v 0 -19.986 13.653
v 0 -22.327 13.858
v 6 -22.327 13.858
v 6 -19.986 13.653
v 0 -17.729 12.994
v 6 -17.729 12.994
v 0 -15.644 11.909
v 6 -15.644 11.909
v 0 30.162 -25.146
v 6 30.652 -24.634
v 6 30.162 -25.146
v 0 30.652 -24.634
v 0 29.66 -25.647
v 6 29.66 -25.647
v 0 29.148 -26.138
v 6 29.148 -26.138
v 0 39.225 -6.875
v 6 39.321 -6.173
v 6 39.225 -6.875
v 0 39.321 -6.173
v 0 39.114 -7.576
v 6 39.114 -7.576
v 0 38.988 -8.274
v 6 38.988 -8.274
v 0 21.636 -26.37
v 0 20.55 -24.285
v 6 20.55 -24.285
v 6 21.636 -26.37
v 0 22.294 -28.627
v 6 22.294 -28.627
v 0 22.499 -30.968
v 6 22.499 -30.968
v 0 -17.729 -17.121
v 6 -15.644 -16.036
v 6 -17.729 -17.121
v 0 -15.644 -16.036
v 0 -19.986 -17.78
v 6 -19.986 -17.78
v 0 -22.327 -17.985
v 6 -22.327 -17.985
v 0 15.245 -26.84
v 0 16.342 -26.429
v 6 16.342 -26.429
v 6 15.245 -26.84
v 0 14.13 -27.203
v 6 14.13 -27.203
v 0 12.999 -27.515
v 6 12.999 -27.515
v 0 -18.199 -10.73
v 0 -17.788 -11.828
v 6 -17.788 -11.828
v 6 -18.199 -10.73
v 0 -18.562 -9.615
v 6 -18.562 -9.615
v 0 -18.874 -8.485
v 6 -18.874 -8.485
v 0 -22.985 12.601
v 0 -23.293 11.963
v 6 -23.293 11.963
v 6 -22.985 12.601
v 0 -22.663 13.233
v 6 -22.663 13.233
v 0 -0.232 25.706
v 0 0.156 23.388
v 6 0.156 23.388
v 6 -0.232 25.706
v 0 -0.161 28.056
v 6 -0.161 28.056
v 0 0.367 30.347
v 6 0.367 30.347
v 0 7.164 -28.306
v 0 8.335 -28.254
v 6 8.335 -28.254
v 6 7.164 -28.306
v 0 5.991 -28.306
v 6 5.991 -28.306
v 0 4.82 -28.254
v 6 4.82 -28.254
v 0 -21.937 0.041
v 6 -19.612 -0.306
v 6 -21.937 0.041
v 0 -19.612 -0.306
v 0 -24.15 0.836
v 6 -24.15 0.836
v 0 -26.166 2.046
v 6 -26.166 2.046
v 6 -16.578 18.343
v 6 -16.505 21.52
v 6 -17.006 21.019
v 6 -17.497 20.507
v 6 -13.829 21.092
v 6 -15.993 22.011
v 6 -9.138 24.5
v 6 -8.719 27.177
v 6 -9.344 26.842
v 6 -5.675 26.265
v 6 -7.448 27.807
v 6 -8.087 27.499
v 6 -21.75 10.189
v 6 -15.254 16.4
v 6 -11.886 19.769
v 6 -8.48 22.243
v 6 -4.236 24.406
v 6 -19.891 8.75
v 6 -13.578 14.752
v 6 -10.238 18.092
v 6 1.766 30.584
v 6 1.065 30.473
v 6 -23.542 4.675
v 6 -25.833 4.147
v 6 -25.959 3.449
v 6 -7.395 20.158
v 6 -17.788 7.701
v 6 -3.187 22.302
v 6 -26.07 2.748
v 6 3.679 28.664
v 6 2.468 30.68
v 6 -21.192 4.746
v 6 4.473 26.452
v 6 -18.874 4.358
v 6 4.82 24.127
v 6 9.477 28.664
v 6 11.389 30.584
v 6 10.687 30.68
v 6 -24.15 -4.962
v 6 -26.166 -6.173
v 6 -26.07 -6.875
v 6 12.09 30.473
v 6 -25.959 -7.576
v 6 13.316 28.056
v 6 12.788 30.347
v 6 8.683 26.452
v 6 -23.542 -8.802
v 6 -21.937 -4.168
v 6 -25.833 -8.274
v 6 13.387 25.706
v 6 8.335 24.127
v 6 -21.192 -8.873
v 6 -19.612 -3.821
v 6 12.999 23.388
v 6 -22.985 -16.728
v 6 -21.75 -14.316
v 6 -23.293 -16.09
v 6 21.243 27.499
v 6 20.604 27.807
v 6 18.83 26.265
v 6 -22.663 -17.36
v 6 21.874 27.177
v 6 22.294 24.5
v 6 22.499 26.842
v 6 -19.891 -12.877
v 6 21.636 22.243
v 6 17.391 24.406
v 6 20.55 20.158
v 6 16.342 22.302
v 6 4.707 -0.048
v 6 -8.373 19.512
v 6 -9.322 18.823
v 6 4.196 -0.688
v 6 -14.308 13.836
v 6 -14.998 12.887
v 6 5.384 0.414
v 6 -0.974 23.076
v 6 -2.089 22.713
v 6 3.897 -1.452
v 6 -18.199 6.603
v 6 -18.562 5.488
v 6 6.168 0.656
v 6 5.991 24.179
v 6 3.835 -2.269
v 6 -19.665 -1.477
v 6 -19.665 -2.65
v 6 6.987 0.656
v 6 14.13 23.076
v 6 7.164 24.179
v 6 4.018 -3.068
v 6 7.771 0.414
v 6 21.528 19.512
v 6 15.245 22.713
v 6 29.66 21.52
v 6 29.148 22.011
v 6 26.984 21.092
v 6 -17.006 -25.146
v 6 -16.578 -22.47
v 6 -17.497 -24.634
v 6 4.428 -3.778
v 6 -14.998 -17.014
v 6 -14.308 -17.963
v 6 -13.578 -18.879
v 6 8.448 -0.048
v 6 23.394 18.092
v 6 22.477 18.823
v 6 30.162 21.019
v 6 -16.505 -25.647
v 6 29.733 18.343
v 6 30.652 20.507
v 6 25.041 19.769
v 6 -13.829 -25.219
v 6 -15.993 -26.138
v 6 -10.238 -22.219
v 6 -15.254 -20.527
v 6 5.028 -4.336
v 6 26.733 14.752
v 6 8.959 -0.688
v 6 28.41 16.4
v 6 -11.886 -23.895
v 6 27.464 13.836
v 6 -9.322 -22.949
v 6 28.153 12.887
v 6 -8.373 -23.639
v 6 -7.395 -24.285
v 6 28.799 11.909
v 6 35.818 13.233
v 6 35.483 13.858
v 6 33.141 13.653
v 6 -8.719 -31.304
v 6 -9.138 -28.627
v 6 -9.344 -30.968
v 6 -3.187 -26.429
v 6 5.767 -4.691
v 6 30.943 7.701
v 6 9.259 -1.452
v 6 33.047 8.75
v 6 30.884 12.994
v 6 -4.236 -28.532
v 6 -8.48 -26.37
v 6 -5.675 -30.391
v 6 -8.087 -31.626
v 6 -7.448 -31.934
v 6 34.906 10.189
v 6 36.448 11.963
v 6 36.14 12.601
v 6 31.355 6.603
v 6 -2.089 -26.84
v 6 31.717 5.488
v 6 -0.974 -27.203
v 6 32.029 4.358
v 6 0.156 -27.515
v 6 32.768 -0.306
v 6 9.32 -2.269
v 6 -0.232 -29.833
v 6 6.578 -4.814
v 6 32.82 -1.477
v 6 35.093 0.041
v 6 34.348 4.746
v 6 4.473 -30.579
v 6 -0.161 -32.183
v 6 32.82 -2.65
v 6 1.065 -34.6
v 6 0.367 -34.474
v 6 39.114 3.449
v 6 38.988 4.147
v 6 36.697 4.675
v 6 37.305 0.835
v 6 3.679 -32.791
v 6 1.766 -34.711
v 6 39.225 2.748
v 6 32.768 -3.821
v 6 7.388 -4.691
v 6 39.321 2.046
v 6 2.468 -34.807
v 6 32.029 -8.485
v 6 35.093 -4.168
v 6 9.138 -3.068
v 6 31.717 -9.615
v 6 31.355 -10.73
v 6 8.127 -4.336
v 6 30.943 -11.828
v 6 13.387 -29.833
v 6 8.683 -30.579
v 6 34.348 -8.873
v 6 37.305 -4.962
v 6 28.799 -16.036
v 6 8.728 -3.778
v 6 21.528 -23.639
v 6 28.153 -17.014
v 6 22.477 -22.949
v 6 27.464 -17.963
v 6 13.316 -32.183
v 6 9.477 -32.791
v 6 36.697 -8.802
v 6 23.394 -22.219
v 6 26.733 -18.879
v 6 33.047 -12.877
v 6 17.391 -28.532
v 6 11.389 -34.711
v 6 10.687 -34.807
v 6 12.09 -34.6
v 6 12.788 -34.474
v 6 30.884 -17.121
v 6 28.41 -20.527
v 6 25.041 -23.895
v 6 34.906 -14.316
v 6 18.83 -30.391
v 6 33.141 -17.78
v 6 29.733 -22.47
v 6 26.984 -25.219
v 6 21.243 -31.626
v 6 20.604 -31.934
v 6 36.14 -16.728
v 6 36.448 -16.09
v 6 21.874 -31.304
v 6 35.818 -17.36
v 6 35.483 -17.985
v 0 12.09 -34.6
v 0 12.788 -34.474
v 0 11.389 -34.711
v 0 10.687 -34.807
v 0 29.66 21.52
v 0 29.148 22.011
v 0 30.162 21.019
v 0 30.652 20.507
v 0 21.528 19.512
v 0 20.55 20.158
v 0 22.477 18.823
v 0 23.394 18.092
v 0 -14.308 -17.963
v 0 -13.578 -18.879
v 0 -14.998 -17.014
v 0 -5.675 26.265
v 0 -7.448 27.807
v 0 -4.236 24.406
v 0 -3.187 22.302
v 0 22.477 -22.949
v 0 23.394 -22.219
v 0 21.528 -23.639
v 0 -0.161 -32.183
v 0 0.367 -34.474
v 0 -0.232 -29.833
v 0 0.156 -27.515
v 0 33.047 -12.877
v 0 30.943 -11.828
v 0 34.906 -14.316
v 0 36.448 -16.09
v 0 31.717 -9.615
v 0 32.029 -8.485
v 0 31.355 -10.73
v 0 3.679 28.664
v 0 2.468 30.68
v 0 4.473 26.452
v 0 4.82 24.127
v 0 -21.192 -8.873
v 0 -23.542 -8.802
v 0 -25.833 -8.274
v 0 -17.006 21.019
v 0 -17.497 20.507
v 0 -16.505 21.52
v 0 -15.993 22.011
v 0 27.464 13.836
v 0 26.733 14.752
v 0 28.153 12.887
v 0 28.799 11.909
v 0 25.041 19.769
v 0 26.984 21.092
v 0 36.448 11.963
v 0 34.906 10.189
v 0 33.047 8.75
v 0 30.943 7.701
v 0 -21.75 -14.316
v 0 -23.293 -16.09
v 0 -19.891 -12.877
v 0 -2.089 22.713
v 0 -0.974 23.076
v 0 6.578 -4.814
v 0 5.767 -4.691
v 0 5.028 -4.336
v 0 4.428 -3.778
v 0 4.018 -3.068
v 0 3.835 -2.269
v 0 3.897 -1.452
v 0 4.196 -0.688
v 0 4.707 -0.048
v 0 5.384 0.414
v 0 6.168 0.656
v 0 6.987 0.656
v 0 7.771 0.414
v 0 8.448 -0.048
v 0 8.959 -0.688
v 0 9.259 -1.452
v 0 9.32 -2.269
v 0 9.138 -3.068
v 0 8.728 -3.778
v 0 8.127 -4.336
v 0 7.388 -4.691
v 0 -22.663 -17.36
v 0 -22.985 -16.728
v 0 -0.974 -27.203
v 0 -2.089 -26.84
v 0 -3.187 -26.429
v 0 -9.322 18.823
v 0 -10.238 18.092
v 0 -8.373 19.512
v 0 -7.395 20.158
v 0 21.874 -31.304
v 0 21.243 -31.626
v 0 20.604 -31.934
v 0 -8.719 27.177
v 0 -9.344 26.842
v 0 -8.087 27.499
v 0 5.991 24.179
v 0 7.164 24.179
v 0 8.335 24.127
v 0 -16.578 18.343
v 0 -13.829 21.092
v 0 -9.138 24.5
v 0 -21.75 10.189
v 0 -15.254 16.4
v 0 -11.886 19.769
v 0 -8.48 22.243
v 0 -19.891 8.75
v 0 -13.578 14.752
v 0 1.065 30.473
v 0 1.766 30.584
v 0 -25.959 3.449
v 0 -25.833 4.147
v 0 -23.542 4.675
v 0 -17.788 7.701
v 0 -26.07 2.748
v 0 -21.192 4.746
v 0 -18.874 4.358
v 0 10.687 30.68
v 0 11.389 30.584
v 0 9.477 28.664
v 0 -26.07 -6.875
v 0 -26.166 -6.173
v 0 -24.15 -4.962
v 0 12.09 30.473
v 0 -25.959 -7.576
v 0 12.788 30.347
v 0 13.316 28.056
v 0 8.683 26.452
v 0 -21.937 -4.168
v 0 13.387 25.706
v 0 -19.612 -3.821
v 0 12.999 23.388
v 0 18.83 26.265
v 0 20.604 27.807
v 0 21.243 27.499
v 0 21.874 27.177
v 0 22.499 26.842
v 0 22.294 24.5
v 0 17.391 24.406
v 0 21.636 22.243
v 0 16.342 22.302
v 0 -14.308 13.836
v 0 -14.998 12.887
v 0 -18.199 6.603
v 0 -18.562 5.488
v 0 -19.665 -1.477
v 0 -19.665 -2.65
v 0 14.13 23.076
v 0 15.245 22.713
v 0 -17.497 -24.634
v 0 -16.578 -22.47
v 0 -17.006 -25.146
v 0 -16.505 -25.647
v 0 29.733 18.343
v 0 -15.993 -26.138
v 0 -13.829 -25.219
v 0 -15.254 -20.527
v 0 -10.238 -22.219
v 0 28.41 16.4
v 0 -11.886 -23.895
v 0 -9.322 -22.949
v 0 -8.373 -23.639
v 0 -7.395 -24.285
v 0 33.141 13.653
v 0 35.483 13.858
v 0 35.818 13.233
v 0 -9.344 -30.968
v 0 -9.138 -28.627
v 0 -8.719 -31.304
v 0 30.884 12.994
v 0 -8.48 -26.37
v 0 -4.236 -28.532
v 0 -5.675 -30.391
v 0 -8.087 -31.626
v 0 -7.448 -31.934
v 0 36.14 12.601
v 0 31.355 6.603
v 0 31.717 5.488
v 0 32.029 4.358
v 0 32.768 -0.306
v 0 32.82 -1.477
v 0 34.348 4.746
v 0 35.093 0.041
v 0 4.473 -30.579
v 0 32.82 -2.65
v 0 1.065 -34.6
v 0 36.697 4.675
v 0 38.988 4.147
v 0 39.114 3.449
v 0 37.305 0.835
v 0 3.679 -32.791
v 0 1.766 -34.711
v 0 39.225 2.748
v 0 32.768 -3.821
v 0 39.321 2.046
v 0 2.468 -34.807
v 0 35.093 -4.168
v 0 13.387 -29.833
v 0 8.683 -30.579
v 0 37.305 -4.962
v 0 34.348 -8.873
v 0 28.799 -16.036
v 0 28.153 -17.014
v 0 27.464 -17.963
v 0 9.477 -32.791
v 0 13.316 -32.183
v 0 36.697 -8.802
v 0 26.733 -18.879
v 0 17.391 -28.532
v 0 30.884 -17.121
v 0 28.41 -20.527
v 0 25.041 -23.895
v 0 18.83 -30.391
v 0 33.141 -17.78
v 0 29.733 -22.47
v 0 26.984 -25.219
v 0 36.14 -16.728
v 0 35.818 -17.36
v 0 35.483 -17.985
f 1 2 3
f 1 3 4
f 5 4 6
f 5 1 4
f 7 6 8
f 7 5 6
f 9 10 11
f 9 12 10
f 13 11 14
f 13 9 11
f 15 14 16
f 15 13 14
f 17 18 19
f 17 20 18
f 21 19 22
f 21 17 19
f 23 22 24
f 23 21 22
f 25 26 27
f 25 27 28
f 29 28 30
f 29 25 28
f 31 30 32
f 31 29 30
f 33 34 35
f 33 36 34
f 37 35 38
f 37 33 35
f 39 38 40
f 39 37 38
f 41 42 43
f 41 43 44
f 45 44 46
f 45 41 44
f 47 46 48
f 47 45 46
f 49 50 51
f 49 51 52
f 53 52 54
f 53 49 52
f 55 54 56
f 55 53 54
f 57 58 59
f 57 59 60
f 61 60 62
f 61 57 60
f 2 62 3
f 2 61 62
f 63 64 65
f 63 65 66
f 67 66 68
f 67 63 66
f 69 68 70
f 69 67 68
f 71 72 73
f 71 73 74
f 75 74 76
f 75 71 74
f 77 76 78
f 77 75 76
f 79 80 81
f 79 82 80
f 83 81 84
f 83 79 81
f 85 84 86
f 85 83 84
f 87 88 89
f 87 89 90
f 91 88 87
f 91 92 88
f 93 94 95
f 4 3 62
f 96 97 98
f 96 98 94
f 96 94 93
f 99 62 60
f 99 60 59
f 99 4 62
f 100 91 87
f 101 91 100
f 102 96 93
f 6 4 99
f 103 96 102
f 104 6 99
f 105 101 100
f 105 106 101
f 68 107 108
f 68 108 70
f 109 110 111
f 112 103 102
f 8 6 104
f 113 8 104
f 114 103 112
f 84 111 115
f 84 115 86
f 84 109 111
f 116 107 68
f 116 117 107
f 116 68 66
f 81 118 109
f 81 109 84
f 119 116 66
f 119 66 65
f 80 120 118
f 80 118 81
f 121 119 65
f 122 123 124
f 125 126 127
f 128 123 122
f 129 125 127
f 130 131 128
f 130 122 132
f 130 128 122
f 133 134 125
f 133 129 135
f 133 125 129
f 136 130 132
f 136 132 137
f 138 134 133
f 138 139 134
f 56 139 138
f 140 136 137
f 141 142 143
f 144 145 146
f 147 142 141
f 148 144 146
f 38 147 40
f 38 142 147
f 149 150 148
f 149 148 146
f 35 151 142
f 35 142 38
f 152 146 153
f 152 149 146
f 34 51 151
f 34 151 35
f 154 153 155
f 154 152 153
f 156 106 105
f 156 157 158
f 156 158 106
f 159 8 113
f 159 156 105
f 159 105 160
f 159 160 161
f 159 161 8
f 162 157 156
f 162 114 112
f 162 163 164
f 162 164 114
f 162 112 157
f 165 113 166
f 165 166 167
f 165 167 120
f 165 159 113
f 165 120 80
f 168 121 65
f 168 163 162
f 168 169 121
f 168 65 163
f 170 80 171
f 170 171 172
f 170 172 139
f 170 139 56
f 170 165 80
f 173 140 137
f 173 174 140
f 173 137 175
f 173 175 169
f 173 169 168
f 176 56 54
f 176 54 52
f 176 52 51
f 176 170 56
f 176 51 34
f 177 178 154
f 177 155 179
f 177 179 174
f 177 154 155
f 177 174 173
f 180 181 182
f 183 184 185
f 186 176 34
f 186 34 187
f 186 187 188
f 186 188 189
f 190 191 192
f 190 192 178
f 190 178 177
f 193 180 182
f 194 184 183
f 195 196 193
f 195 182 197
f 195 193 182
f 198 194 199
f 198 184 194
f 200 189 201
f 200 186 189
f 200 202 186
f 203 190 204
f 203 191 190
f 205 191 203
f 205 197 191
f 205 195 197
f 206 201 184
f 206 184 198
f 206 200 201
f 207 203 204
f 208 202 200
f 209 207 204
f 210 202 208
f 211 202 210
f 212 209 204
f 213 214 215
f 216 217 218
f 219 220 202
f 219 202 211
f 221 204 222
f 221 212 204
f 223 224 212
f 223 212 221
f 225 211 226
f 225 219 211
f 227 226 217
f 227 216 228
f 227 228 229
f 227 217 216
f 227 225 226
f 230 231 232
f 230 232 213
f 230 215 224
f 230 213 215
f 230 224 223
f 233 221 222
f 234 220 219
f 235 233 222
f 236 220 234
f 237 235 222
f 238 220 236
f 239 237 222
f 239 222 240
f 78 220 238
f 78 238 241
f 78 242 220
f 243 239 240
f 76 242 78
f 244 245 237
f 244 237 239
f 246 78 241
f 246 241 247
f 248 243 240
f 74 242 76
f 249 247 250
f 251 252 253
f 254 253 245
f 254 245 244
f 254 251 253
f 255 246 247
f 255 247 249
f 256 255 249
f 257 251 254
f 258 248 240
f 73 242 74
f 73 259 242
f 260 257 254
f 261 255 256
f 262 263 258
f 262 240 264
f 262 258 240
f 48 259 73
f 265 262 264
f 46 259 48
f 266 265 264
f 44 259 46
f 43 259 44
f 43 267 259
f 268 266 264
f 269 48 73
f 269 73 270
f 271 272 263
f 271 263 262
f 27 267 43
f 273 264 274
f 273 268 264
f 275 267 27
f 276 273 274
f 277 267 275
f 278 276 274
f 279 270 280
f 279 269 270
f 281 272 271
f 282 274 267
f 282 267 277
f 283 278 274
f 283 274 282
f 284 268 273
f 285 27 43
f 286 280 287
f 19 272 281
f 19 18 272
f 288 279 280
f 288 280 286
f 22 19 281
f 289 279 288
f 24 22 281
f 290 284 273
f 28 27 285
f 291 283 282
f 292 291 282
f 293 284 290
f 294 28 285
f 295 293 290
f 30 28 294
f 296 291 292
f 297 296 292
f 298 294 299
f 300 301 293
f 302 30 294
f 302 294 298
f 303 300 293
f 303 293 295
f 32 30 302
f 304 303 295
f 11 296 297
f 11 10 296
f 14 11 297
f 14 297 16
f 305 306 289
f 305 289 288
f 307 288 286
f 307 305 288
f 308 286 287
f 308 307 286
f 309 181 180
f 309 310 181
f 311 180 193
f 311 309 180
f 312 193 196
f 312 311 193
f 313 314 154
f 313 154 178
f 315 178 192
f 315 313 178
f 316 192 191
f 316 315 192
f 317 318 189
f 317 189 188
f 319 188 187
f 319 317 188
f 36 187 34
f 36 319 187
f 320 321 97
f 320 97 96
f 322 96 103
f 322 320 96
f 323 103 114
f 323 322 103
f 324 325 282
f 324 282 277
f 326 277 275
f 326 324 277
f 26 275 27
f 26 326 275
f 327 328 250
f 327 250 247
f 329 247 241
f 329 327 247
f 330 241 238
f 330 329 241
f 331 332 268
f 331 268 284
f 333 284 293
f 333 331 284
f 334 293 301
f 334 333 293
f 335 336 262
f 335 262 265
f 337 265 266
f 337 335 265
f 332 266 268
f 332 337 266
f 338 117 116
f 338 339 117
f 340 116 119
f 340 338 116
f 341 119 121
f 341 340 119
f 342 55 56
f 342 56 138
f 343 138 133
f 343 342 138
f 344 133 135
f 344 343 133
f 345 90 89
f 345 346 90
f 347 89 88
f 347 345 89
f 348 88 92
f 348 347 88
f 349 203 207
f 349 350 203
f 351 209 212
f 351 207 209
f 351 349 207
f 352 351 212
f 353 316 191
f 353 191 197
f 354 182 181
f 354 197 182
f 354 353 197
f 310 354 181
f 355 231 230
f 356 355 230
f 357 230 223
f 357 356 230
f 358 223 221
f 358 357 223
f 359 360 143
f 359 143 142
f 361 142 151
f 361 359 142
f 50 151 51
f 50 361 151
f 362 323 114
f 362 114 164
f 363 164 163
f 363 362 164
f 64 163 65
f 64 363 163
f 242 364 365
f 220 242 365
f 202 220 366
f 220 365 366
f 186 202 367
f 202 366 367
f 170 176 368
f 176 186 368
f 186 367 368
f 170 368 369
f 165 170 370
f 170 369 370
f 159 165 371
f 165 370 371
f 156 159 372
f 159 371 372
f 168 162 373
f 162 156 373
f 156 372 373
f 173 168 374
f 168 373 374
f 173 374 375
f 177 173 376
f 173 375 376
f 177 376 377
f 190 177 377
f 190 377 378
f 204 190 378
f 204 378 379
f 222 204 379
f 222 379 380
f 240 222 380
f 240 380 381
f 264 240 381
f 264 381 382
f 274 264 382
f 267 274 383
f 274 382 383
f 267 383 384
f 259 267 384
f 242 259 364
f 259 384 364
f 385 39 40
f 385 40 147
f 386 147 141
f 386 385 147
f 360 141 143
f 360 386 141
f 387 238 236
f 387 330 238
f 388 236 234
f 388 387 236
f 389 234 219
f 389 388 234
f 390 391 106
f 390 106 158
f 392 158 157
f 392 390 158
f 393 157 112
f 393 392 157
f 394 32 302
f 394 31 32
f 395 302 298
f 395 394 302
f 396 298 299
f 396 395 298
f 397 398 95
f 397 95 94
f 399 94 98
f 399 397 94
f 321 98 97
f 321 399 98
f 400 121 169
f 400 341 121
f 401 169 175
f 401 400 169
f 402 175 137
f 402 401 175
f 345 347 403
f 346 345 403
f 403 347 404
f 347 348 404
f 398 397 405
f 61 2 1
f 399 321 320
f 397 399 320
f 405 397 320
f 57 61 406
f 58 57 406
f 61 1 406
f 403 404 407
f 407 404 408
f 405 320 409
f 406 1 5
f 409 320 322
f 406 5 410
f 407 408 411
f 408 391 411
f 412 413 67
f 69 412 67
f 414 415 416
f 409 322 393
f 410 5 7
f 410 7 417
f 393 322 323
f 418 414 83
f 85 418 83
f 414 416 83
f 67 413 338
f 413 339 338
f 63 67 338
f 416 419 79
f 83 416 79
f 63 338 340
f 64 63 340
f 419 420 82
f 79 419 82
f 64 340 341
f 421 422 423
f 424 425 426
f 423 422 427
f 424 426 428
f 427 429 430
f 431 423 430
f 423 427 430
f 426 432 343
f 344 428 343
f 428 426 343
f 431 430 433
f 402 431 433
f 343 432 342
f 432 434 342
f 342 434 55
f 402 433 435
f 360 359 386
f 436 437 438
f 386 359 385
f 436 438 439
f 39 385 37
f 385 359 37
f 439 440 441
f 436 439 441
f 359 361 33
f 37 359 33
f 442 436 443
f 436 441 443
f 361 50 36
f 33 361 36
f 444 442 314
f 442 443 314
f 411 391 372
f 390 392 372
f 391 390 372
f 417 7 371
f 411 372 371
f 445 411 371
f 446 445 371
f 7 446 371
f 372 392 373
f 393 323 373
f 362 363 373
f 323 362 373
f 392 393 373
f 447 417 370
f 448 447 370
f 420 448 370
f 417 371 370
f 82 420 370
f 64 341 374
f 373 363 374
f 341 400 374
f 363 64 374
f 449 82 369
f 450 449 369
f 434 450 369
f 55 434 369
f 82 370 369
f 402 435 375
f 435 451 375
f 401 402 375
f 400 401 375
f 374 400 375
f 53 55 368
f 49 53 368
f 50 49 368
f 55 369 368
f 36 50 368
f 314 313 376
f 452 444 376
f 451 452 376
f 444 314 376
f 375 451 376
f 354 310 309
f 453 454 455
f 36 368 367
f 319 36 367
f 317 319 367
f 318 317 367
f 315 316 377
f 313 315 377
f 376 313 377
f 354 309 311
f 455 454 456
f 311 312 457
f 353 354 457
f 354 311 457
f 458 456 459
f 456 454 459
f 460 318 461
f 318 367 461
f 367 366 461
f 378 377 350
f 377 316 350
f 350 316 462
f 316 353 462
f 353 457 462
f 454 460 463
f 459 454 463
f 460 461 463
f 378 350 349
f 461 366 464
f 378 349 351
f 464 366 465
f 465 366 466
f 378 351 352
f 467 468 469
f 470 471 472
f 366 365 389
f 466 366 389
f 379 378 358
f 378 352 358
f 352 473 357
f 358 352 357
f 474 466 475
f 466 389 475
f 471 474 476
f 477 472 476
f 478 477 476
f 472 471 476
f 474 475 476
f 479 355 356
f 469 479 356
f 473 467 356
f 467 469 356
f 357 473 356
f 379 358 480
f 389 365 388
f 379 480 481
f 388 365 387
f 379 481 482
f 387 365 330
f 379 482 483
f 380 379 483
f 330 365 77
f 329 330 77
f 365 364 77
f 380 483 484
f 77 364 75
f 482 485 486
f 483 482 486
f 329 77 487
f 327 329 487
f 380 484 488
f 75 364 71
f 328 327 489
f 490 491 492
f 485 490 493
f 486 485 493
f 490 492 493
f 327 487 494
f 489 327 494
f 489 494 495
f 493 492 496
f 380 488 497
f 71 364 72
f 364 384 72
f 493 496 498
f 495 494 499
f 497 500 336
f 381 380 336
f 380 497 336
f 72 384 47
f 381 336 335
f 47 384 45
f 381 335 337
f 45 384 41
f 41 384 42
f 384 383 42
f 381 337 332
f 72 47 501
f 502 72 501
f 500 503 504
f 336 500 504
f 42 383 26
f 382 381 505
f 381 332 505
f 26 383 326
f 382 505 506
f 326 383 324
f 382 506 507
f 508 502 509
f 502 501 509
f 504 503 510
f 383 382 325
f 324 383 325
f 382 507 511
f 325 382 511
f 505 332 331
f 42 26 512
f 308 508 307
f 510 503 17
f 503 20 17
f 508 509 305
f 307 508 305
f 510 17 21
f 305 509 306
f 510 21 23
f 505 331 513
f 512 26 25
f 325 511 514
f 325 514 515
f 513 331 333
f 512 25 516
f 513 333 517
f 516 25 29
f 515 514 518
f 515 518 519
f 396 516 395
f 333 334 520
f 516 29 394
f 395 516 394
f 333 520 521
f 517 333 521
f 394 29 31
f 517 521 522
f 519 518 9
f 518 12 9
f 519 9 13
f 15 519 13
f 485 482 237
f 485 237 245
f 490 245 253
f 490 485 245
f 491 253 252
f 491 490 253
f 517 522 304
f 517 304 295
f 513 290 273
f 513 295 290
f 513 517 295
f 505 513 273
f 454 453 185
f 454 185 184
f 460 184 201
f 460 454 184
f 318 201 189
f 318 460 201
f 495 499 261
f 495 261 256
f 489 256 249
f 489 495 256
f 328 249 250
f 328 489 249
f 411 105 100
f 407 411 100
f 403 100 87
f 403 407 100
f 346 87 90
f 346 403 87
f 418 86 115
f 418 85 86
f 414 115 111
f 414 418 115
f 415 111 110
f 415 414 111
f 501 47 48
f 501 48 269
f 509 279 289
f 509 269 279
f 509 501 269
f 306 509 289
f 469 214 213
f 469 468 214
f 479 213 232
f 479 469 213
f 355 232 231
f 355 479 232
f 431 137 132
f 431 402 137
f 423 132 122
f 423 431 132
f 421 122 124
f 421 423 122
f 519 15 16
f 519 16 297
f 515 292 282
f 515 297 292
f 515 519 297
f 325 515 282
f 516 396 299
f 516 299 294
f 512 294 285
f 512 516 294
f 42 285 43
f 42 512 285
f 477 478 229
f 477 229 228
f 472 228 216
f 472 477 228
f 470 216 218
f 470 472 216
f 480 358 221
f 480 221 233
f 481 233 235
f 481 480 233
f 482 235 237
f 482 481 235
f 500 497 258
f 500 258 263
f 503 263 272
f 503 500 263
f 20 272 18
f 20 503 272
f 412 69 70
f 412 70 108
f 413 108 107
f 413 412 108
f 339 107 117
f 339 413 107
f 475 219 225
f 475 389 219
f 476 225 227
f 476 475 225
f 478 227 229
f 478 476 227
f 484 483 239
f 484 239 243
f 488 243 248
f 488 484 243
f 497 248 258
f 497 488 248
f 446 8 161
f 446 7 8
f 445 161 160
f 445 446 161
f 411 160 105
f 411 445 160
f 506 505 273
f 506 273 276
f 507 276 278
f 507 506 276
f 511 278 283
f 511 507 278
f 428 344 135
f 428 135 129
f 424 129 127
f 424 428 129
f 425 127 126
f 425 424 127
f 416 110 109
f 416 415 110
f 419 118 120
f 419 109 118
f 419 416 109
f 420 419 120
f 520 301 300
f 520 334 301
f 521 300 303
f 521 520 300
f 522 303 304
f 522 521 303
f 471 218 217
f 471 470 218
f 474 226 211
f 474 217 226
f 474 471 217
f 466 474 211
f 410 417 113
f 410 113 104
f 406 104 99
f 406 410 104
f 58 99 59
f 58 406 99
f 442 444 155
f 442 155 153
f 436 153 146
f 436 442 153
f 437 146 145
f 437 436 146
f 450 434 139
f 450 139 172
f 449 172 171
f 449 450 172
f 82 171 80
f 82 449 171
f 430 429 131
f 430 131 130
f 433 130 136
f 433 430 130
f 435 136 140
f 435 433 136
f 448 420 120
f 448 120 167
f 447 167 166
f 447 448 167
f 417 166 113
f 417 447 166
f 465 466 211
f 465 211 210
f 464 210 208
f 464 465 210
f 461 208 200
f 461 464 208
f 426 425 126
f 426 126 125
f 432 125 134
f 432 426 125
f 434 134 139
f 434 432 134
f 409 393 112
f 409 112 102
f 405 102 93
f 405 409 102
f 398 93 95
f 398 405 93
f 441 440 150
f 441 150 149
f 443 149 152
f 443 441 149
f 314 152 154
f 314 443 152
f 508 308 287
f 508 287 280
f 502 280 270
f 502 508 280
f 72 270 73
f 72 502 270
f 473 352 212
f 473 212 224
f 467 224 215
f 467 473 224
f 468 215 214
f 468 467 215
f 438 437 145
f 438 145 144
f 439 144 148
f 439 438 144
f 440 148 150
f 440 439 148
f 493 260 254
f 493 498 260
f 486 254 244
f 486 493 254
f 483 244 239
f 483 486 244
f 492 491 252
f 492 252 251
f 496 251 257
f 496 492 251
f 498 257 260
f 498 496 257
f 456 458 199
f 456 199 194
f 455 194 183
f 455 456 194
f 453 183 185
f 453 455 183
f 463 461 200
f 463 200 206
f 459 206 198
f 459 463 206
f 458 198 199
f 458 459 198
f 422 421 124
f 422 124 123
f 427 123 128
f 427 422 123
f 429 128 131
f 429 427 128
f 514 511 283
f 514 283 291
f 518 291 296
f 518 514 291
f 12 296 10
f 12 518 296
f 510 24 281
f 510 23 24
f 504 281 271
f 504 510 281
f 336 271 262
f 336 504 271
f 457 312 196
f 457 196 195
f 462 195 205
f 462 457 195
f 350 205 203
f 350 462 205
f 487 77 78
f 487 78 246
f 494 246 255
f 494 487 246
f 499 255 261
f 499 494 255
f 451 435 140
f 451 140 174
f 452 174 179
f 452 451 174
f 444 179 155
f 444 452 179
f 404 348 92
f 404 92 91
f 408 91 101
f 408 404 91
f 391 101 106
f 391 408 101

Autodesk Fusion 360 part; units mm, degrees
sketch "Sketch1" plane through (0, 0, 0) normal (1, 0, 0) x (0, 0, -1)
  arc A0 (28.2536, 4.8202) -> (28.2536, 8.3351) centre (2.0635, 6.5776) ccw
  arc A1 (28.2536, 8.3351) -> (34.8066, 10.6867) centre (27.6511, 20.3199) ccw
  arc A2 (17.9851, 35.4827) -> (16.0896, 36.4485) centre (2.0635, 6.5776) ccw
  arc A3 (8.4852, 32.029) -> (8.2737, 38.988) centre (-3.0992, 35.1595) ccw
  arc A4 (34.8066, 10.6867) -> (34.4738, 12.7878) centre (2.0635, 6.5776) ccw
  arc A5 (6.1726, 39.3208) -> (3.8209, 32.7677) centre (15.8058, 32.1653) ccw
  arc A6 (18.8794, -13.5776) -> (24.6337, -17.4969) centre (28.2213, -6.0457) ccw
  arc A7 (16.0896, -23.2932) -> (17.9851, -22.3274) centre (2.0635, 6.5776) ccw
  arc A8 (22.2187, -10.2383) -> (24.2847, -7.3947) centre (2.0635, 6.5776) ccw
  arc A9 (3.8209, 32.7677) -> (0.306, 32.7677) centre (2.0635, 6.5776) ccw
  arc A10 (0.306, -19.6125) -> (3.8209, -19.6125) centre (2.0635, 6.5776) ccw
  arc A11 (24.6337, -17.4969) -> (26.138, -15.9926) centre (2.0635, 6.5776) ccw
  arc A12 (-13.8582, -22.3274) -> (-11.9627, -23.2932) centre (2.0635, 6.5776) ccw
  arc A13 (31.9343, -7.4485) -> (26.4286, -3.187) centre (22.1521, -14.3991) ccw
  arc A14 (6.1726, 39.3208) -> (3.8209, 32.7677) centre (15.8058, 32.1653) ccw
  arc A15 (-14.7525, -13.5776) -> (-11.9089, -15.6436) centre (2.0635, 6.5776) ccw
  arc A16 (8.2737, -25.8327) -> (8.4852, -18.8737) centre (-3.0992, -22.0043) ccw
  arc A17 (-7.7012, -17.7875) -> (-4.3583, -18.8737) centre (2.0635, 6.5776) ccw
  arc A18 (0.306, -19.6125) -> (3.8209, -19.6125) centre (2.0635, 6.5776) ccw
  arc A19 (26.4286, -3.187) -> (27.5148, 0.1559) centre (2.0635, 6.5776) ccw
  arc A20 (8.4852, -18.8737) -> (11.8281, -17.7875) centre (2.0635, 6.5776) ccw
  arc A21 (8.2737, 38.988) -> (6.1726, 39.3208) centre (2.0635, 6.5776) ccw
  arc A22 (6.1726, -26.1655) -> (8.2737, -25.8327) centre (2.0635, 6.5776) ccw
  arc A23 (8.4852, -18.8737) -> (11.8281, -17.7875) centre (2.0635, 6.5776) ccw
  arc A24 (11.8281, -17.7875) -> (16.0896, -23.2932) centre (23.0402, -13.5111) ccw
  arc A25 (30.9685, -9.344) -> (31.9343, -7.4485) centre (2.0635, 6.5776) ccw
  arc A26 (17.9851, -22.3274) -> (16.0358, -15.6436) centre (5.9857, -22.2007) ccw
  arc A27 (6.1726, -26.1655) -> (8.2737, -25.8327) centre (2.0635, 6.5776) ccw
  arc A28 (3.8209, -19.6125) -> (6.1726, -26.1655) centre (15.8058, -19.01) ccw
  arc A29 (34.4738, 0.3674) -> (34.8066, 2.4685) centre (2.0635, 6.5776) ccw
  arc A30 (34.8066, 2.4685) -> (28.2536, 4.8202) centre (27.6511, -7.1647) ccw
  arc A31 (18.8794, 26.7329) -> (16.0358, 28.7989) centre (2.0635, 6.5776) ccw
  arc A32 (-11.9089, -15.6436) -> (-13.8582, -22.3274) centre (-1.8588, -22.2007) ccw
  arc A33 (11.8281, -17.7875) -> (16.0896, -23.2932) centre (23.0402, -13.5111) ccw
  arc A34 (8.4852, 32.029) -> (8.2737, 38.988) centre (-3.0992, 35.1595) ccw
  arc A35 (16.0896, -23.2932) -> (17.9851, -22.3274) centre (2.0635, 6.5776) ccw
  arc A36 (16.0896, 36.4485) -> (11.8281, 30.9428) centre (23.0402, 26.6663) ccw
  arc A37 (16.0358, -15.6436) -> (18.8794, -13.5776) centre (2.0635, 6.5776) ccw
  arc A38 (-4.3583, -18.8737) -> (-4.1467, -25.8327) centre (7.2261, -22.0043) ccw
  arc A39 (-11.9627, -23.2932) -> (-7.7012, -17.7875) centre (-18.9133, -13.5111) ccw
  arc A40 (3.8209, -19.6125) -> (6.1726, -26.1655) centre (15.8058, -19.01) ccw
  arc A41 (11.8281, 30.9428) -> (8.4852, 32.029) centre (2.0635, 6.5776) ccw
  arc A42 (-4.1467, -25.8327) -> (-2.0457, -26.1655) centre (2.0635, 6.5776) ccw
  arc A43 (17.9851, -22.3274) -> (16.0358, -15.6436) centre (5.9857, -22.2007) ccw
  arc A44 (16.0358, -15.6436) -> (18.8794, -13.5776) centre (2.0635, 6.5776) ccw
  arc A45 (24.2847, -7.3947) -> (30.9685, -9.344) centre (30.8418, 2.6554) ccw
  arc A46 (30.9685, 22.4993) -> (24.2847, 20.55) centre (30.8418, 10.4999) ccw
  arc A47 (18.8794, 26.7329) -> (16.0358, 28.7989) centre (2.0635, 6.5776) ccw
  arc A48 (26.138, 29.1479) -> (24.6337, 30.6521) centre (2.0635, 6.5776) ccw
  arc A49 (24.2847, 20.55) -> (22.2187, 23.3936) centre (2.0635, 6.5776) ccw
  arc A50 (27.5148, 12.9994) -> (26.4286, 16.3423) centre (2.0635, 6.5776) ccw
  arc A51 (17.9851, 35.4827) -> (16.0896, 36.4485) centre (2.0635, 6.5776) ccw
  arc A52 (31.9343, 20.6038) -> (30.9685, 22.4993) centre (2.0635, 6.5776) ccw
  arc A53 (8.2737, 38.988) -> (6.1726, 39.3208) centre (2.0635, 6.5776) ccw
  arc A54 (16.0896, 36.4485) -> (11.8281, 30.9428) centre (23.0402, 26.6663) ccw
  arc A55 (24.6337, 30.6521) -> (18.8794, 26.7329) centre (28.2213, 19.201) ccw
  arc A56 (16.0358, 28.7989) -> (17.9851, 35.4827) centre (5.9857, 35.356) ccw
  arc A57 (-2.0457, -26.1655) -> (0.306, -19.6125) centre (-11.6789, -19.01) ccw
  arc A58 (16.0358, 28.7989) -> (17.9851, 35.4827) centre (5.9857, 35.356) ccw
  arc A59 (27.5148, 0.1559) -> (34.4738, 0.3674) centre (30.6454, 11.7403) ccw
  arc A60 (8.2737, -25.8327) -> (8.4852, -18.8737) centre (-3.0992, -22.0043) ccw
  arc A61 (3.8209, 32.7677) -> (0.306, 32.7677) centre (2.0635, 6.5776) ccw
  arc A62 (26.4286, 16.3423) -> (31.9343, 20.6038) centre (22.1521, 27.5544) ccw
  arc A63 (22.2187, 23.3936) -> (26.138, 29.1479) centre (14.6868, 32.7354) ccw
  arc A64 (11.8281, 30.9428) -> (8.4852, 32.029) centre (2.0635, 6.5776) ccw
  arc A65 (34.4738, 12.7878) -> (27.5148, 12.9994) centre (30.6454, 1.4149) ccw
  arc A66 (-27.8074, -7.4485) -> (-26.8416, -9.344) centre (2.0635, 6.5776) ccw
  arc A67 (30.9685, 22.4993) -> (24.2847, 20.55) centre (30.8418, 10.4999) ccw
  arc A68 (-14.7525, -13.5776) -> (-11.9089, -15.6436) centre (2.0635, 6.5776) ccw
  arc A69 (-7.7012, -17.7875) -> (-4.3583, -18.8737) centre (2.0635, 6.5776) ccw
  arc A70 (-4.3583, -18.8737) -> (-4.1467, -25.8327) centre (7.2261, -22.0043) ccw
  arc A71 (-20.5068, -17.4969) -> (-14.7525, -13.5776) centre (-24.0944, -6.0457) ccw
  arc A72 (-13.8582, -22.3274) -> (-11.9627, -23.2932) centre (2.0635, 6.5776) ccw
  arc A73 (-18.0918, -10.2383) -> (-22.0111, -15.9926) centre (-10.5599, -19.5802) ccw
  arc A74 (-30.6797, 2.4685) -> (-30.3469, 0.3674) centre (2.0635, 6.5776) ccw
  arc A75 (-27.8074, 20.6038) -> (-22.3017, 16.3423) centre (-18.0252, 27.5544) ccw
  arc A76 (-11.9089, 28.7989) -> (-14.7525, 26.7329) centre (2.0635, 6.5776) ccw
  arc A77 (24.6337, 30.6521) -> (18.8794, 26.7329) centre (28.2213, 19.201) ccw
  arc A78 (-18.0918, 23.3936) -> (-20.1578, 20.55) centre (2.0635, 6.5776) ccw
  arc A79 (-30.3469, 0.3674) -> (-23.3879, 0.1559) centre (-26.5185, 11.7403) ccw
  arc A80 (34.4738, 0.3674) -> (34.8066, 2.4685) centre (2.0635, 6.5776) ccw
  arc A81 (-7.7012, 30.9428) -> (-11.9627, 36.4485) centre (-18.9133, 26.6663) ccw
  arc A82 (34.8066, 2.4685) -> (28.2536, 4.8202) centre (27.6511, -7.1647) ccw
  arc A83 (-4.1467, 38.988) -> (-4.3583, 32.029) centre (7.2261, 35.1595) ccw
  arc A84 (-18.0918, -10.2383) -> (-22.0111, -15.9926) centre (-10.5599, -19.5802) ccw
  arc A85 (26.138, 29.1479) -> (24.6337, 30.6521) centre (2.0635, 6.5776) ccw
  arc A86 (-22.0111, -15.9926) -> (-20.5068, -17.4969) centre (2.0635, 6.5776) ccw
  arc A87 (-20.1578, -7.3947) -> (-18.0918, -10.2383) centre (2.0635, 6.5776) ccw
  arc A88 (-24.1266, 8.3351) -> (-24.1266, 4.8202) centre (2.0635, 6.5776) ccw
  arc A89 (-26.8416, -9.344) -> (-20.1578, -7.3947) centre (-26.7149, 2.6554) ccw
  arc A90 (22.2187, 23.3936) -> (26.138, 29.1479) centre (14.6868, 32.7354) ccw
  arc A91 (28.2536, 4.8202) -> (28.2536, 8.3351) centre (2.0635, 6.5776) ccw
  arc A92 (24.6337, -17.4969) -> (26.138, -15.9926) centre (2.0635, 6.5776) ccw
  arc A93 (-27.8074, -7.4485) -> (-26.8416, -9.344) centre (2.0635, 6.5776) ccw
  arc A94 (22.2187, -10.2383) -> (24.2847, -7.3947) centre (2.0635, 6.5776) ccw
  arc A95 (34.8066, 10.6867) -> (34.4738, 12.7878) centre (2.0635, 6.5776) ccw
  arc A96 (27.5148, 12.9994) -> (26.4286, 16.3423) centre (2.0635, 6.5776) ccw
  arc A97 (24.2847, 20.55) -> (22.2187, 23.3936) centre (2.0635, 6.5776) ccw
  arc A98 (28.2536, 8.3351) -> (34.8066, 10.6867) centre (27.6511, 20.3199) ccw
  arc A99 (-26.8416, 22.4993) -> (-27.8074, 20.6038) centre (2.0635, 6.5776) ccw
  arc A100 (-11.9627, -23.2932) -> (-7.7012, -17.7875) centre (-18.9133, -13.5111) ccw
  arc A101 (27.5148, 0.1559) -> (34.4738, 0.3674) centre (30.6454, 11.7403) ccw
  arc A102 (34.4738, 12.7878) -> (27.5148, 12.9994) centre (30.6454, 1.4149) ccw
  arc A103 (-22.3017, -3.187) -> (-27.8074, -7.4485) centre (-18.0252, -14.3991) ccw
  arc A104 (-20.5068, 30.6521) -> (-22.0111, 29.1479) centre (2.0635, 6.5776) ccw
  arc A105 (26.138, -15.9926) -> (22.2187, -10.2383) centre (14.6868, -19.5802) ccw
  arc A106 (26.4286, -3.187) -> (27.5148, 0.1559) centre (2.0635, 6.5776) ccw
  arc A107 (18.8794, -13.5776) -> (24.6337, -17.4969) centre (28.2213, -6.0457) ccw
  arc A108 (30.9685, -9.344) -> (31.9343, -7.4485) centre (2.0635, 6.5776) ccw
  arc A109 (31.9343, -7.4485) -> (26.4286, -3.187) centre (22.1521, -14.3991) ccw
  arc A110 (-23.3879, 0.1559) -> (-22.3017, -3.187) centre (2.0635, 6.5776) ccw
  arc A111 (26.4286, 16.3423) -> (31.9343, 20.6038) centre (22.1521, 27.5544) ccw
  arc A112 (31.9343, 20.6038) -> (30.9685, 22.4993) centre (2.0635, 6.5776) ccw
  arc A113 (-30.3469, 0.3674) -> (-23.3879, 0.1559) centre (-26.5185, 11.7403) ccw
  arc A114 (24.2847, -7.3947) -> (30.9685, -9.344) centre (30.8418, 2.6554) ccw
  arc A115 (-14.7525, 26.7329) -> (-20.5068, 30.6521) centre (-24.0944, 19.201) ccw
  arc A116 (-26.8416, -9.344) -> (-20.1578, -7.3947) centre (-26.7149, 2.6554) ccw
  arc A117 (-20.1578, -7.3947) -> (-18.0918, -10.2383) centre (2.0635, 6.5776) ccw
  arc A118 (0.306, 32.7677) -> (-2.0457, 39.3208) centre (-11.6789, 32.1653) ccw
  arc A119 (-24.1266, 4.8202) -> (-30.6797, 2.4685) centre (-23.5242, -7.1647) ccw
  arc A120 (-26.8416, 22.4993) -> (-27.8074, 20.6038) centre (2.0635, 6.5776) ccw
  arc A121 (-30.3469, 12.7878) -> (-30.6797, 10.6867) centre (2.0635, 6.5776) ccw
  arc A122 (-11.9089, -15.6436) -> (-13.8582, -22.3274) centre (-1.8588, -22.2007) ccw
  arc A123 (-4.1467, -25.8327) -> (-2.0457, -26.1655) centre (2.0635, 6.5776) ccw
  arc A124 (-23.3879, 12.9994) -> (-30.3469, 12.7878) centre (-26.5185, 1.4149) ccw
  arc A125 (-22.0111, 29.1479) -> (-18.0918, 23.3936) centre (-10.5599, 32.7354) ccw
  arc A126 (-22.3017, -3.187) -> (-27.8074, -7.4485) centre (-18.0252, -14.3991) ccw
  arc A127 (-20.5068, -17.4969) -> (-14.7525, -13.5776) centre (-24.0944, -6.0457) ccw
  arc A128 (-4.3583, 32.029) -> (-7.7012, 30.9428) centre (2.0635, 6.5776) ccw
  arc A129 (-2.0457, 39.3208) -> (-4.1467, 38.988) centre (2.0635, 6.5776) ccw
  arc A130 (-18.0918, 23.3936) -> (-20.1578, 20.55) centre (2.0635, 6.5776) ccw
  arc A131 (-23.3879, 0.1559) -> (-22.3017, -3.187) centre (2.0635, 6.5776) ccw
  arc A132 (-20.1578, 20.55) -> (-26.8416, 22.4993) centre (-26.7149, 10.4999) ccw
  arc A133 (-27.8074, 20.6038) -> (-22.3017, 16.3423) centre (-18.0252, 27.5544) ccw
  arc A134 (-2.0457, -26.1655) -> (0.306, -19.6125) centre (-11.6789, -19.01) ccw
  arc A135 (-22.0111, -15.9926) -> (-20.5068, -17.4969) centre (2.0635, 6.5776) ccw
  arc A136 (-24.1266, 8.3351) -> (-24.1266, 4.8202) centre (2.0635, 6.5776) ccw
  arc A137 (-24.1266, 4.8202) -> (-30.6797, 2.4685) centre (-23.5242, -7.1647) ccw
  arc A138 (-14.7525, 26.7329) -> (-20.5068, 30.6521) centre (-24.0944, 19.201) ccw
  arc A139 (-11.9627, 36.4485) -> (-13.8582, 35.4827) centre (2.0635, 6.5776) ccw
  arc A140 (-2.0457, 39.3208) -> (-4.1467, 38.988) centre (2.0635, 6.5776) ccw
  arc A141 (-20.1578, 20.55) -> (-26.8416, 22.4993) centre (-26.7149, 10.4999) ccw
  arc A142 (-30.3469, 12.7878) -> (-30.6797, 10.6867) centre (2.0635, 6.5776) ccw
  arc A143 (-20.5068, 30.6521) -> (-22.0111, 29.1479) centre (2.0635, 6.5776) ccw
  arc A144 (-4.1467, 38.988) -> (-4.3583, 32.029) centre (7.2261, 35.1595) ccw
  arc A145 (-11.9627, 36.4485) -> (-13.8582, 35.4827) centre (2.0635, 6.5776) ccw
  arc A146 (-30.6797, 2.4685) -> (-30.3469, 0.3674) centre (2.0635, 6.5776) ccw
  arc A147 (0.306, 32.7677) -> (-2.0457, 39.3208) centre (-11.6789, 32.1653) ccw
  arc A148 (-23.3879, 12.9994) -> (-30.3469, 12.7878) centre (-26.5185, 1.4149) ccw
  arc A149 (-13.8582, 35.4827) -> (-11.9089, 28.7989) centre (-1.8588, 35.356) ccw
  arc A150 (-13.8582, 35.4827) -> (-11.9089, 28.7989) centre (-1.8588, 35.356) ccw
  arc A151 (-22.3017, 16.3423) -> (-23.3879, 12.9994) centre (2.0635, 6.5776) ccw
  arc A152 (-4.3583, 32.029) -> (-7.7012, 30.9428) centre (2.0635, 6.5776) ccw
  arc A153 (-11.9089, 28.7989) -> (-14.7525, 26.7329) centre (2.0635, 6.5776) ccw
  arc A154 (-22.3017, 16.3423) -> (-23.3879, 12.9994) centre (2.0635, 6.5776) ccw
  arc A155 (-22.0111, 29.1479) -> (-18.0918, 23.3936) centre (-10.5599, 32.7354) ccw
  arc A156 (-7.7012, 30.9428) -> (-11.9627, 36.4485) centre (-18.9133, 26.6663) ccw
  arc A157 (-30.6797, 10.6867) -> (-24.1266, 8.3351) centre (-23.5242, 20.3199) ccw
  arc A158 (-30.6797, 10.6867) -> (-24.1266, 8.3351) centre (-23.5242, 20.3199) ccw
  arc A159 (26.138, -15.9926) -> (22.2187, -10.2383) centre (14.6868, -19.5802) ccw
  circle A160 centre (2.0635, 6.5776) radius 2.75
  dimension "d4" = 5.5
extrude "Extrude1" add sketch "Sketch1" along normal blind 6
